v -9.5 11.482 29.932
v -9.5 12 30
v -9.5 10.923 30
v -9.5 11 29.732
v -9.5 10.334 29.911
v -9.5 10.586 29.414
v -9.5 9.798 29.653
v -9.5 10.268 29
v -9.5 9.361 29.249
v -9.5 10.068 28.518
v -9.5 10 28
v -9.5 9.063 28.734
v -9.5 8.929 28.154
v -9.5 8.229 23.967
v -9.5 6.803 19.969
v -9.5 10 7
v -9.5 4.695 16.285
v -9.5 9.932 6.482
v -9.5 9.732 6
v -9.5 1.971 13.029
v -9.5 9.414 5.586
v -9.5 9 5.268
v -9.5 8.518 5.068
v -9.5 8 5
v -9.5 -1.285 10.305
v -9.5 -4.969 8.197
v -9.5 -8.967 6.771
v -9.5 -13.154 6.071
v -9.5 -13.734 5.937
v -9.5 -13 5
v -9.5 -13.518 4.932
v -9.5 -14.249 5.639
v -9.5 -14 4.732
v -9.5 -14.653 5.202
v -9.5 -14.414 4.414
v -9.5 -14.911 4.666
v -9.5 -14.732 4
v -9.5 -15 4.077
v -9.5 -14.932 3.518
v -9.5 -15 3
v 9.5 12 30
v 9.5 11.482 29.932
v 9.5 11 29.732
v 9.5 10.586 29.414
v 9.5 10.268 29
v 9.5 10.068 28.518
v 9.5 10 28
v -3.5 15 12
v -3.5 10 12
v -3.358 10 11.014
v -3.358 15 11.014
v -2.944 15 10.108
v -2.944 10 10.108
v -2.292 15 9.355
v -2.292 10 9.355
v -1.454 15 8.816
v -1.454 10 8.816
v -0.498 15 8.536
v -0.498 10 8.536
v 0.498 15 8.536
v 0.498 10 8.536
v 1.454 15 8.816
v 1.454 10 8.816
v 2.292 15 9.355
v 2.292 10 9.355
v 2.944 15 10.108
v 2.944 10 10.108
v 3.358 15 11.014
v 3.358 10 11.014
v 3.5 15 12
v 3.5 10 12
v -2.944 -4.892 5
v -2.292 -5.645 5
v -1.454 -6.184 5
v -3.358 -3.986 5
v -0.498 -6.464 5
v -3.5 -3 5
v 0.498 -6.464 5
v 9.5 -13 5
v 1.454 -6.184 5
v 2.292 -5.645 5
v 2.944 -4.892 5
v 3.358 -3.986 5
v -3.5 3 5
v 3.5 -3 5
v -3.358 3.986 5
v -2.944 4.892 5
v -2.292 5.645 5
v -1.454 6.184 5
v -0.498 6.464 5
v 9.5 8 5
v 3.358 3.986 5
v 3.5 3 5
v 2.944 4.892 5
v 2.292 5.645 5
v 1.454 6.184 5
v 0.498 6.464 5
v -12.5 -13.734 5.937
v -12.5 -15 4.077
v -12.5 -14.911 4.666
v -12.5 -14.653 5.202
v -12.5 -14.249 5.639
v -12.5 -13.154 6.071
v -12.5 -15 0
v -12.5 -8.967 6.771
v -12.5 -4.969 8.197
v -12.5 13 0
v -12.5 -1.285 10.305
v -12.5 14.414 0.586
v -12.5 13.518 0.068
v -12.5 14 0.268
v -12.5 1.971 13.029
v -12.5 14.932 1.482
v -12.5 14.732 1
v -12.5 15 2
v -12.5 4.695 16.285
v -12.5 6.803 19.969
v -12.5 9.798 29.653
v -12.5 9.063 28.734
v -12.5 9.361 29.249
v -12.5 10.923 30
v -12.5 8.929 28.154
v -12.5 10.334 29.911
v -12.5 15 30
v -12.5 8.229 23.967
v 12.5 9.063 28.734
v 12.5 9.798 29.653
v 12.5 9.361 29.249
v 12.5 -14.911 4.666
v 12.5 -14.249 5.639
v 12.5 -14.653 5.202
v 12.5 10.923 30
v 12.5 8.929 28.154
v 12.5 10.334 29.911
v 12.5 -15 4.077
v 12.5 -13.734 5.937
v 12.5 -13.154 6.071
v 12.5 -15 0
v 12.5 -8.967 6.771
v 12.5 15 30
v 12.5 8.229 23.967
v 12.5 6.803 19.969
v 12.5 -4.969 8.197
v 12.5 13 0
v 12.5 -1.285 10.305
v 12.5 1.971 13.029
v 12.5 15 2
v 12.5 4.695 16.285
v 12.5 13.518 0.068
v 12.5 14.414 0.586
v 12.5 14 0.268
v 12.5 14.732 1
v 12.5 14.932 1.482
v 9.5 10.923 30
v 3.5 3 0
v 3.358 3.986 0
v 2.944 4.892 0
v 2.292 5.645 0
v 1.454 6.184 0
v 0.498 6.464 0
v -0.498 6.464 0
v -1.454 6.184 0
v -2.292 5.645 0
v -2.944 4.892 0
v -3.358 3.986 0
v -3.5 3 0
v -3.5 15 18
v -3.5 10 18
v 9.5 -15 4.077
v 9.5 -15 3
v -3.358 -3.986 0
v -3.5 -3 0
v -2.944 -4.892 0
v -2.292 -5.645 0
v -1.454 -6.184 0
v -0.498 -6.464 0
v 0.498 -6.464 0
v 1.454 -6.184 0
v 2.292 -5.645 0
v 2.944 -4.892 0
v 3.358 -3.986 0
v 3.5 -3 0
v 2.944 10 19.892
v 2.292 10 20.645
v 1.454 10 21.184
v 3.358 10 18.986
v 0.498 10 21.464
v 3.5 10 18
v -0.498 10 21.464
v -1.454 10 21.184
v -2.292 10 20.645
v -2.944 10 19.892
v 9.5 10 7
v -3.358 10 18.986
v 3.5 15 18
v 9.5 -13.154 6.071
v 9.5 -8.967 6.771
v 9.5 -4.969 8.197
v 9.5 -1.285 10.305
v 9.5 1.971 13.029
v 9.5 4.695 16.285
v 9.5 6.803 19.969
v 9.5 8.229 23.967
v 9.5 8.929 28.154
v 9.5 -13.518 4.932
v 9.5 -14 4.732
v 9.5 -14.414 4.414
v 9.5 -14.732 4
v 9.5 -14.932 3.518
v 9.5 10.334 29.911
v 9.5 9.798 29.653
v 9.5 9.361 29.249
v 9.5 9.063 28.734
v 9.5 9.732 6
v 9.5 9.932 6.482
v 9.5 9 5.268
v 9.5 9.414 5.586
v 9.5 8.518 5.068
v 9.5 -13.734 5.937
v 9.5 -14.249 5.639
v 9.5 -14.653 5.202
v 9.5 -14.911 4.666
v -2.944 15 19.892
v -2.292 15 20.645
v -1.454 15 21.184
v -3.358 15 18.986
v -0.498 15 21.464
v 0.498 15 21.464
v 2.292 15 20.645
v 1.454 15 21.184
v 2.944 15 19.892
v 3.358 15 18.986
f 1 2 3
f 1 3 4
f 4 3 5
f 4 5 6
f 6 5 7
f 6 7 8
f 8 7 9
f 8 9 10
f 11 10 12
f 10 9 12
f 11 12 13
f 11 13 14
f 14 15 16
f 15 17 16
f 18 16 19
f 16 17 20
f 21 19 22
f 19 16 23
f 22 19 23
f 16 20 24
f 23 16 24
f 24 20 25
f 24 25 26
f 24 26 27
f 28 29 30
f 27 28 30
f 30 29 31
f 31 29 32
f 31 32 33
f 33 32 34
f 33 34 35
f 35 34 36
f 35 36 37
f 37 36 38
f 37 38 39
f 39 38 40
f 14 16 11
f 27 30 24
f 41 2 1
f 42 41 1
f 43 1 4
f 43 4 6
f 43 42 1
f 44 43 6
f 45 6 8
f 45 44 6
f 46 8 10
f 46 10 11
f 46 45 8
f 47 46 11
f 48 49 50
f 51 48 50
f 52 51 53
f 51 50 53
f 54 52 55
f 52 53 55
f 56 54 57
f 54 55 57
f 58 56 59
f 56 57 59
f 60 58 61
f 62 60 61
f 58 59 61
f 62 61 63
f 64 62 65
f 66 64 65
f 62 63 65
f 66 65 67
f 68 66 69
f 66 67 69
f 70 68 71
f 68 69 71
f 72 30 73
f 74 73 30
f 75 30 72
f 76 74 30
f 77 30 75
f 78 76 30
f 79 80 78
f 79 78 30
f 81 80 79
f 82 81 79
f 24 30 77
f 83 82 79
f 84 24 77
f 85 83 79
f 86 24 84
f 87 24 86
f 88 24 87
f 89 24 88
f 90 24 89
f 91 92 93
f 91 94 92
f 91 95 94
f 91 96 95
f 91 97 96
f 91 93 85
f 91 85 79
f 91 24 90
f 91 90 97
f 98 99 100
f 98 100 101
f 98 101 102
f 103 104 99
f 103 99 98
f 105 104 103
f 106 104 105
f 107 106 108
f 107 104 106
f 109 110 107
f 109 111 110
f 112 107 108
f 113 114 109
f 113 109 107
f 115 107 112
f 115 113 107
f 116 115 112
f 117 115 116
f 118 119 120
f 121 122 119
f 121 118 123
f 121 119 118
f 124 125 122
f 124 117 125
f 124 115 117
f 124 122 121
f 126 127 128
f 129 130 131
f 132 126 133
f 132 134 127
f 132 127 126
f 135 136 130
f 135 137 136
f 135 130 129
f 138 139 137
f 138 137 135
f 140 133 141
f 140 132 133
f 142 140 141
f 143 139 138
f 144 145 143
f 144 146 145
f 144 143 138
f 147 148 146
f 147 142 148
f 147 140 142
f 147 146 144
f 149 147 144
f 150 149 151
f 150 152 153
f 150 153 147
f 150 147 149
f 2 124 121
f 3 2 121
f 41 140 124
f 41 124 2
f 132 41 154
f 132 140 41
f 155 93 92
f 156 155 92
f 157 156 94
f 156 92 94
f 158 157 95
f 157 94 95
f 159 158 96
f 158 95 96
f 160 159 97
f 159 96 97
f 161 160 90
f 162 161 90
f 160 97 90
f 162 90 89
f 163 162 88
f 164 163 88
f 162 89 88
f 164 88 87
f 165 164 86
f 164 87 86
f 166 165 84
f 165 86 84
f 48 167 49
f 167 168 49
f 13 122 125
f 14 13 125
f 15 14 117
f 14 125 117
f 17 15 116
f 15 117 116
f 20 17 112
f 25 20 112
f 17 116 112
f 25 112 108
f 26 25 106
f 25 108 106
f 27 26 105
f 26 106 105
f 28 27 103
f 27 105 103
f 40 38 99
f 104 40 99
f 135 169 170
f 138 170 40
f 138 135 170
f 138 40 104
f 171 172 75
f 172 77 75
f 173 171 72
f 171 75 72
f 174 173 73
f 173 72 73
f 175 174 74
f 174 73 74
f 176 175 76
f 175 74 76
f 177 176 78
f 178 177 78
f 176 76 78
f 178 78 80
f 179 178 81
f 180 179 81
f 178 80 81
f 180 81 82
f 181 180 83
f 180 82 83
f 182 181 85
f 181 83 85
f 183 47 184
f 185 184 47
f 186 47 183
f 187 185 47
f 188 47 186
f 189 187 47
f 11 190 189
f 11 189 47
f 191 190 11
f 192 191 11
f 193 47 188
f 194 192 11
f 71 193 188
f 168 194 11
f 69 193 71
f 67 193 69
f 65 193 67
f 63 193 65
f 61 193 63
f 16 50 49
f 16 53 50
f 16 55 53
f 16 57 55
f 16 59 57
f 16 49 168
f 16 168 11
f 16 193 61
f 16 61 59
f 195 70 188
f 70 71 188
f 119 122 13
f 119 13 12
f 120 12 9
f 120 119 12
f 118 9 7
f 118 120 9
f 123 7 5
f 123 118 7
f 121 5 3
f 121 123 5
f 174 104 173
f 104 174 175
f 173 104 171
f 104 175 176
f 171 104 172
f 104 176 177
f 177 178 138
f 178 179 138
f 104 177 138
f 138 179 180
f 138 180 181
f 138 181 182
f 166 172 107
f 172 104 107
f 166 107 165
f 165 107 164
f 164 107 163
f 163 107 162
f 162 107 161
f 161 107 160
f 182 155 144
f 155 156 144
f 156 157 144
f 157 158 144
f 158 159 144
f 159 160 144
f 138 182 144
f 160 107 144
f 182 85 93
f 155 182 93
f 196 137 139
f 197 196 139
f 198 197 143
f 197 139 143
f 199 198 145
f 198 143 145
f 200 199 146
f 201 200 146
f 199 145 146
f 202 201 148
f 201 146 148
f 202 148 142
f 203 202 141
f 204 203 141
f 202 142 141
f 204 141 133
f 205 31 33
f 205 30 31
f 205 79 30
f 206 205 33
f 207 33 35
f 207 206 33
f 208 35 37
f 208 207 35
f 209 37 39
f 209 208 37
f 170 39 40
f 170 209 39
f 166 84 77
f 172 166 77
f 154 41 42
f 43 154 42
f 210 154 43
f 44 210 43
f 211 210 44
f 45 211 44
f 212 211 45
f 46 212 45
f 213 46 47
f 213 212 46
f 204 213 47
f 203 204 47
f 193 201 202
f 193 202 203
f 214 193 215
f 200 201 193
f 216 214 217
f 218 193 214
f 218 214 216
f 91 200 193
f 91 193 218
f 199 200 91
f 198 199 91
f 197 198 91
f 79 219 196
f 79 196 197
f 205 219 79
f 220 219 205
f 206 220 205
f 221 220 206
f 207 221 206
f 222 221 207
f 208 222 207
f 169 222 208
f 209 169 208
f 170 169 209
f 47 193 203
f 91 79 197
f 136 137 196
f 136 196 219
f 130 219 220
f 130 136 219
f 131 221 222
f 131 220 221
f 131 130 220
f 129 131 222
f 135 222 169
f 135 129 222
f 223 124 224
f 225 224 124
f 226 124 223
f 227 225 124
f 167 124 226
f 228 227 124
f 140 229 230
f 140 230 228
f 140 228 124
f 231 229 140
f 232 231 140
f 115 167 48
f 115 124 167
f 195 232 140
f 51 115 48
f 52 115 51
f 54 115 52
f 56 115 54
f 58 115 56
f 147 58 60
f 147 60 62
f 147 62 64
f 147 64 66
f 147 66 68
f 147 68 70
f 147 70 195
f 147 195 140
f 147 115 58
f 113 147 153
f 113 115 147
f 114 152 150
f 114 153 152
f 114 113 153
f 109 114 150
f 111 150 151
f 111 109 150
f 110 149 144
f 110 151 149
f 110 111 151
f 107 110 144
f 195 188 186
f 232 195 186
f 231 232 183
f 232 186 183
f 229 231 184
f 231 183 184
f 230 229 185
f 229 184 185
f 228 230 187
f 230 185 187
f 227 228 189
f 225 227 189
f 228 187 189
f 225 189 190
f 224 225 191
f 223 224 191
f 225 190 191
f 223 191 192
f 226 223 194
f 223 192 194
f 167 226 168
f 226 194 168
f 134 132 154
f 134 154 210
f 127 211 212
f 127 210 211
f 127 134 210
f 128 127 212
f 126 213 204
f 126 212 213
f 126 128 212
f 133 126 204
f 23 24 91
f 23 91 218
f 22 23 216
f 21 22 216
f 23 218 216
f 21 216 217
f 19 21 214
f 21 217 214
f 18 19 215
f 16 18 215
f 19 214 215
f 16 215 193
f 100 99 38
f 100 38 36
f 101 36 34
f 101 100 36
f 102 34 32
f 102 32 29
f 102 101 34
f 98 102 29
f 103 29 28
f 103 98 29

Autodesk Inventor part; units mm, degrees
ref_plane "YZ Plane" through (0, 0, 0) normal (1, 0, 0) x (0, 1, 0)
ref_plane "XZ Plane" through (0, 0, 0) normal (0, 1, 0) x (-1, 0, 0)
ref_plane "XY Plane" through (0, 0, 0) normal (0, 0, 1) x (1, 0, 0)
sketch "스케치1" plane through (0, 0, 0) normal (0, 0, 1) x (1, 0, 0)
  line L0 (12.5, -15) -> (-12.5, -15)
  line L1 (-12.5, -15) -> (-12.5, 15)
  line L2 (-12.5, 15) -> (12.5, 15)
  line L3 (12.5, 15) -> (12.5, -15)
  line L4 (12.5, -15) -> (-12.5, 15) construction
  line L5 (-12.5, -15) -> (12.5, 15) construction
  point P0 (0, 0)
  dimension "d0" = 25
  dimension "d1" = 30
extrude "돌출1" add sketch "스케치1" along normal blind 5
sketch "스케치2" plane through (0, 0, 5) normal (0, 0, 1) x (1, 0, 0)
  line L0 (12.5, 15) -> (-12.5, 15) projected
  line L1 (12.5, -15) -> (12.5, 15) projected
  line L2 (-12.5, 15) -> (12.5, 15)
  line L3 (12.5, 15) -> (12.5, 10)
  line L4 (12.5, 10) -> (-12.5, 10)
  line L5 (-12.5, 10) -> (-12.5, 15)
  point P0 (0, 0)
  dimension "d4" = 5
extrude "돌출2" add sketch "스케치2" along normal blind 25
sketch "스케치3" plane through (0, 0, 5) normal (0, 0, 1) x (1, 0, 0)
  line L0 (0, -3) -> (0, 3) construction
  line L1 (3.5, -3) -> (3.5, 3)
  line L2 (-3.5, 3) -> (-3.5, -3)
  arc A0 (-3.5, -3) -> (3.5, -3) centre (0, -3) ccw
  arc A1 (3.5, 3) -> (-3.5, 3) centre (0, 3) ccw
  point P0 (0, 0)
  dimension "d7" = 3
  dimension "d8" = 7
extrude "돌출3" cut sketch "스케치3" against normal through all
sketch "스케치4" plane through (-12.5, 10, 5) normal (0, -1, 0) x (1, 0, 0)
  line L0 (25, 0) -> (0, 0) projected
  line L1 (0, 0) -> (12.5, 0)
  line L2 (12.5, 7) -> (12.5, 13) construction
  line L3 (16, 7) -> (16, 13)
  line L4 (9, 13) -> (9, 7)
  arc A0 (9, 7) -> (16, 7) centre (12.5, 7) ccw
  arc A1 (16, 13) -> (9, 13) centre (12.5, 13) ccw
  point P0 (12.5, -5)
  dimension "d14" = 7
extrude "돌출4" cut sketch "스케치4" against normal through all
sketch "스케치5" plane through (-12.5, -15, 0) normal (-1, 0, 0) x (0, 0, 1)
  line L0 (0, 30) -> (0, 0) projected
  line L1 (0, 0) -> (5, 0) projected
  line L2 (5, 25) -> (5, 0) projected
  line L3 (5, 25) -> (30, 25) projected
  line L4 (30, 30) -> (30, 25) projected
  line L5 (0, 30) -> (30, 30) projected
  line L6 (0, 0) -> (0, 30) projected
  line L7 (0, 30) -> (30, 30) projected
  line L8 (0, 0) -> (30, 0)
  line L9 (30, 0) -> (30, 30)
  line L10 (30, 30) -> (0, 30)
  line L11 (0, 30) -> (0, 0)
  line L12 (5, 0) -> (6, 0)
  line L13 (30, 25) -> (30, 24)
  line L14 (30, 24) -> (6, 0)
  circle A0 centre (30, 0) radius 24
  point P0 (0, 15)
  dimension "d17" = 1
  dimension "d18" = 1
extrude "돌출5" add sketch "스케치5" against normal blind 3 contours L2 L3 L9 A0 L8
sketch "스케치6" plane through (12.5, -15, 0) normal (1, 0, 0) x (0, 0, -1)
  line L0 (-30, 25) -> (-5, 25) projected
  line L1 (-30, 25) -> (-30, 24) projected
  arc A0 (-6, 0) -> (-30, 24) centre (-30, 0) ccw projected
  line L2 (-6, 0) -> (-5, 0) projected
  line L3 (-5, 25) -> (-5, 0) projected
  point P0 (0, 15)
extrude "돌출6" add sketch "스케치6" against normal blind 3
fillet "모깎기1" radius 2 8 edges at (-11, -15, 6) (0, -15, 5) (11, -15, 6) (0, 10, 30) (-11, 9, 30) (11, 9, 30) (0, 10, 5) (0, 15, 0)
properties part number "braket2"
